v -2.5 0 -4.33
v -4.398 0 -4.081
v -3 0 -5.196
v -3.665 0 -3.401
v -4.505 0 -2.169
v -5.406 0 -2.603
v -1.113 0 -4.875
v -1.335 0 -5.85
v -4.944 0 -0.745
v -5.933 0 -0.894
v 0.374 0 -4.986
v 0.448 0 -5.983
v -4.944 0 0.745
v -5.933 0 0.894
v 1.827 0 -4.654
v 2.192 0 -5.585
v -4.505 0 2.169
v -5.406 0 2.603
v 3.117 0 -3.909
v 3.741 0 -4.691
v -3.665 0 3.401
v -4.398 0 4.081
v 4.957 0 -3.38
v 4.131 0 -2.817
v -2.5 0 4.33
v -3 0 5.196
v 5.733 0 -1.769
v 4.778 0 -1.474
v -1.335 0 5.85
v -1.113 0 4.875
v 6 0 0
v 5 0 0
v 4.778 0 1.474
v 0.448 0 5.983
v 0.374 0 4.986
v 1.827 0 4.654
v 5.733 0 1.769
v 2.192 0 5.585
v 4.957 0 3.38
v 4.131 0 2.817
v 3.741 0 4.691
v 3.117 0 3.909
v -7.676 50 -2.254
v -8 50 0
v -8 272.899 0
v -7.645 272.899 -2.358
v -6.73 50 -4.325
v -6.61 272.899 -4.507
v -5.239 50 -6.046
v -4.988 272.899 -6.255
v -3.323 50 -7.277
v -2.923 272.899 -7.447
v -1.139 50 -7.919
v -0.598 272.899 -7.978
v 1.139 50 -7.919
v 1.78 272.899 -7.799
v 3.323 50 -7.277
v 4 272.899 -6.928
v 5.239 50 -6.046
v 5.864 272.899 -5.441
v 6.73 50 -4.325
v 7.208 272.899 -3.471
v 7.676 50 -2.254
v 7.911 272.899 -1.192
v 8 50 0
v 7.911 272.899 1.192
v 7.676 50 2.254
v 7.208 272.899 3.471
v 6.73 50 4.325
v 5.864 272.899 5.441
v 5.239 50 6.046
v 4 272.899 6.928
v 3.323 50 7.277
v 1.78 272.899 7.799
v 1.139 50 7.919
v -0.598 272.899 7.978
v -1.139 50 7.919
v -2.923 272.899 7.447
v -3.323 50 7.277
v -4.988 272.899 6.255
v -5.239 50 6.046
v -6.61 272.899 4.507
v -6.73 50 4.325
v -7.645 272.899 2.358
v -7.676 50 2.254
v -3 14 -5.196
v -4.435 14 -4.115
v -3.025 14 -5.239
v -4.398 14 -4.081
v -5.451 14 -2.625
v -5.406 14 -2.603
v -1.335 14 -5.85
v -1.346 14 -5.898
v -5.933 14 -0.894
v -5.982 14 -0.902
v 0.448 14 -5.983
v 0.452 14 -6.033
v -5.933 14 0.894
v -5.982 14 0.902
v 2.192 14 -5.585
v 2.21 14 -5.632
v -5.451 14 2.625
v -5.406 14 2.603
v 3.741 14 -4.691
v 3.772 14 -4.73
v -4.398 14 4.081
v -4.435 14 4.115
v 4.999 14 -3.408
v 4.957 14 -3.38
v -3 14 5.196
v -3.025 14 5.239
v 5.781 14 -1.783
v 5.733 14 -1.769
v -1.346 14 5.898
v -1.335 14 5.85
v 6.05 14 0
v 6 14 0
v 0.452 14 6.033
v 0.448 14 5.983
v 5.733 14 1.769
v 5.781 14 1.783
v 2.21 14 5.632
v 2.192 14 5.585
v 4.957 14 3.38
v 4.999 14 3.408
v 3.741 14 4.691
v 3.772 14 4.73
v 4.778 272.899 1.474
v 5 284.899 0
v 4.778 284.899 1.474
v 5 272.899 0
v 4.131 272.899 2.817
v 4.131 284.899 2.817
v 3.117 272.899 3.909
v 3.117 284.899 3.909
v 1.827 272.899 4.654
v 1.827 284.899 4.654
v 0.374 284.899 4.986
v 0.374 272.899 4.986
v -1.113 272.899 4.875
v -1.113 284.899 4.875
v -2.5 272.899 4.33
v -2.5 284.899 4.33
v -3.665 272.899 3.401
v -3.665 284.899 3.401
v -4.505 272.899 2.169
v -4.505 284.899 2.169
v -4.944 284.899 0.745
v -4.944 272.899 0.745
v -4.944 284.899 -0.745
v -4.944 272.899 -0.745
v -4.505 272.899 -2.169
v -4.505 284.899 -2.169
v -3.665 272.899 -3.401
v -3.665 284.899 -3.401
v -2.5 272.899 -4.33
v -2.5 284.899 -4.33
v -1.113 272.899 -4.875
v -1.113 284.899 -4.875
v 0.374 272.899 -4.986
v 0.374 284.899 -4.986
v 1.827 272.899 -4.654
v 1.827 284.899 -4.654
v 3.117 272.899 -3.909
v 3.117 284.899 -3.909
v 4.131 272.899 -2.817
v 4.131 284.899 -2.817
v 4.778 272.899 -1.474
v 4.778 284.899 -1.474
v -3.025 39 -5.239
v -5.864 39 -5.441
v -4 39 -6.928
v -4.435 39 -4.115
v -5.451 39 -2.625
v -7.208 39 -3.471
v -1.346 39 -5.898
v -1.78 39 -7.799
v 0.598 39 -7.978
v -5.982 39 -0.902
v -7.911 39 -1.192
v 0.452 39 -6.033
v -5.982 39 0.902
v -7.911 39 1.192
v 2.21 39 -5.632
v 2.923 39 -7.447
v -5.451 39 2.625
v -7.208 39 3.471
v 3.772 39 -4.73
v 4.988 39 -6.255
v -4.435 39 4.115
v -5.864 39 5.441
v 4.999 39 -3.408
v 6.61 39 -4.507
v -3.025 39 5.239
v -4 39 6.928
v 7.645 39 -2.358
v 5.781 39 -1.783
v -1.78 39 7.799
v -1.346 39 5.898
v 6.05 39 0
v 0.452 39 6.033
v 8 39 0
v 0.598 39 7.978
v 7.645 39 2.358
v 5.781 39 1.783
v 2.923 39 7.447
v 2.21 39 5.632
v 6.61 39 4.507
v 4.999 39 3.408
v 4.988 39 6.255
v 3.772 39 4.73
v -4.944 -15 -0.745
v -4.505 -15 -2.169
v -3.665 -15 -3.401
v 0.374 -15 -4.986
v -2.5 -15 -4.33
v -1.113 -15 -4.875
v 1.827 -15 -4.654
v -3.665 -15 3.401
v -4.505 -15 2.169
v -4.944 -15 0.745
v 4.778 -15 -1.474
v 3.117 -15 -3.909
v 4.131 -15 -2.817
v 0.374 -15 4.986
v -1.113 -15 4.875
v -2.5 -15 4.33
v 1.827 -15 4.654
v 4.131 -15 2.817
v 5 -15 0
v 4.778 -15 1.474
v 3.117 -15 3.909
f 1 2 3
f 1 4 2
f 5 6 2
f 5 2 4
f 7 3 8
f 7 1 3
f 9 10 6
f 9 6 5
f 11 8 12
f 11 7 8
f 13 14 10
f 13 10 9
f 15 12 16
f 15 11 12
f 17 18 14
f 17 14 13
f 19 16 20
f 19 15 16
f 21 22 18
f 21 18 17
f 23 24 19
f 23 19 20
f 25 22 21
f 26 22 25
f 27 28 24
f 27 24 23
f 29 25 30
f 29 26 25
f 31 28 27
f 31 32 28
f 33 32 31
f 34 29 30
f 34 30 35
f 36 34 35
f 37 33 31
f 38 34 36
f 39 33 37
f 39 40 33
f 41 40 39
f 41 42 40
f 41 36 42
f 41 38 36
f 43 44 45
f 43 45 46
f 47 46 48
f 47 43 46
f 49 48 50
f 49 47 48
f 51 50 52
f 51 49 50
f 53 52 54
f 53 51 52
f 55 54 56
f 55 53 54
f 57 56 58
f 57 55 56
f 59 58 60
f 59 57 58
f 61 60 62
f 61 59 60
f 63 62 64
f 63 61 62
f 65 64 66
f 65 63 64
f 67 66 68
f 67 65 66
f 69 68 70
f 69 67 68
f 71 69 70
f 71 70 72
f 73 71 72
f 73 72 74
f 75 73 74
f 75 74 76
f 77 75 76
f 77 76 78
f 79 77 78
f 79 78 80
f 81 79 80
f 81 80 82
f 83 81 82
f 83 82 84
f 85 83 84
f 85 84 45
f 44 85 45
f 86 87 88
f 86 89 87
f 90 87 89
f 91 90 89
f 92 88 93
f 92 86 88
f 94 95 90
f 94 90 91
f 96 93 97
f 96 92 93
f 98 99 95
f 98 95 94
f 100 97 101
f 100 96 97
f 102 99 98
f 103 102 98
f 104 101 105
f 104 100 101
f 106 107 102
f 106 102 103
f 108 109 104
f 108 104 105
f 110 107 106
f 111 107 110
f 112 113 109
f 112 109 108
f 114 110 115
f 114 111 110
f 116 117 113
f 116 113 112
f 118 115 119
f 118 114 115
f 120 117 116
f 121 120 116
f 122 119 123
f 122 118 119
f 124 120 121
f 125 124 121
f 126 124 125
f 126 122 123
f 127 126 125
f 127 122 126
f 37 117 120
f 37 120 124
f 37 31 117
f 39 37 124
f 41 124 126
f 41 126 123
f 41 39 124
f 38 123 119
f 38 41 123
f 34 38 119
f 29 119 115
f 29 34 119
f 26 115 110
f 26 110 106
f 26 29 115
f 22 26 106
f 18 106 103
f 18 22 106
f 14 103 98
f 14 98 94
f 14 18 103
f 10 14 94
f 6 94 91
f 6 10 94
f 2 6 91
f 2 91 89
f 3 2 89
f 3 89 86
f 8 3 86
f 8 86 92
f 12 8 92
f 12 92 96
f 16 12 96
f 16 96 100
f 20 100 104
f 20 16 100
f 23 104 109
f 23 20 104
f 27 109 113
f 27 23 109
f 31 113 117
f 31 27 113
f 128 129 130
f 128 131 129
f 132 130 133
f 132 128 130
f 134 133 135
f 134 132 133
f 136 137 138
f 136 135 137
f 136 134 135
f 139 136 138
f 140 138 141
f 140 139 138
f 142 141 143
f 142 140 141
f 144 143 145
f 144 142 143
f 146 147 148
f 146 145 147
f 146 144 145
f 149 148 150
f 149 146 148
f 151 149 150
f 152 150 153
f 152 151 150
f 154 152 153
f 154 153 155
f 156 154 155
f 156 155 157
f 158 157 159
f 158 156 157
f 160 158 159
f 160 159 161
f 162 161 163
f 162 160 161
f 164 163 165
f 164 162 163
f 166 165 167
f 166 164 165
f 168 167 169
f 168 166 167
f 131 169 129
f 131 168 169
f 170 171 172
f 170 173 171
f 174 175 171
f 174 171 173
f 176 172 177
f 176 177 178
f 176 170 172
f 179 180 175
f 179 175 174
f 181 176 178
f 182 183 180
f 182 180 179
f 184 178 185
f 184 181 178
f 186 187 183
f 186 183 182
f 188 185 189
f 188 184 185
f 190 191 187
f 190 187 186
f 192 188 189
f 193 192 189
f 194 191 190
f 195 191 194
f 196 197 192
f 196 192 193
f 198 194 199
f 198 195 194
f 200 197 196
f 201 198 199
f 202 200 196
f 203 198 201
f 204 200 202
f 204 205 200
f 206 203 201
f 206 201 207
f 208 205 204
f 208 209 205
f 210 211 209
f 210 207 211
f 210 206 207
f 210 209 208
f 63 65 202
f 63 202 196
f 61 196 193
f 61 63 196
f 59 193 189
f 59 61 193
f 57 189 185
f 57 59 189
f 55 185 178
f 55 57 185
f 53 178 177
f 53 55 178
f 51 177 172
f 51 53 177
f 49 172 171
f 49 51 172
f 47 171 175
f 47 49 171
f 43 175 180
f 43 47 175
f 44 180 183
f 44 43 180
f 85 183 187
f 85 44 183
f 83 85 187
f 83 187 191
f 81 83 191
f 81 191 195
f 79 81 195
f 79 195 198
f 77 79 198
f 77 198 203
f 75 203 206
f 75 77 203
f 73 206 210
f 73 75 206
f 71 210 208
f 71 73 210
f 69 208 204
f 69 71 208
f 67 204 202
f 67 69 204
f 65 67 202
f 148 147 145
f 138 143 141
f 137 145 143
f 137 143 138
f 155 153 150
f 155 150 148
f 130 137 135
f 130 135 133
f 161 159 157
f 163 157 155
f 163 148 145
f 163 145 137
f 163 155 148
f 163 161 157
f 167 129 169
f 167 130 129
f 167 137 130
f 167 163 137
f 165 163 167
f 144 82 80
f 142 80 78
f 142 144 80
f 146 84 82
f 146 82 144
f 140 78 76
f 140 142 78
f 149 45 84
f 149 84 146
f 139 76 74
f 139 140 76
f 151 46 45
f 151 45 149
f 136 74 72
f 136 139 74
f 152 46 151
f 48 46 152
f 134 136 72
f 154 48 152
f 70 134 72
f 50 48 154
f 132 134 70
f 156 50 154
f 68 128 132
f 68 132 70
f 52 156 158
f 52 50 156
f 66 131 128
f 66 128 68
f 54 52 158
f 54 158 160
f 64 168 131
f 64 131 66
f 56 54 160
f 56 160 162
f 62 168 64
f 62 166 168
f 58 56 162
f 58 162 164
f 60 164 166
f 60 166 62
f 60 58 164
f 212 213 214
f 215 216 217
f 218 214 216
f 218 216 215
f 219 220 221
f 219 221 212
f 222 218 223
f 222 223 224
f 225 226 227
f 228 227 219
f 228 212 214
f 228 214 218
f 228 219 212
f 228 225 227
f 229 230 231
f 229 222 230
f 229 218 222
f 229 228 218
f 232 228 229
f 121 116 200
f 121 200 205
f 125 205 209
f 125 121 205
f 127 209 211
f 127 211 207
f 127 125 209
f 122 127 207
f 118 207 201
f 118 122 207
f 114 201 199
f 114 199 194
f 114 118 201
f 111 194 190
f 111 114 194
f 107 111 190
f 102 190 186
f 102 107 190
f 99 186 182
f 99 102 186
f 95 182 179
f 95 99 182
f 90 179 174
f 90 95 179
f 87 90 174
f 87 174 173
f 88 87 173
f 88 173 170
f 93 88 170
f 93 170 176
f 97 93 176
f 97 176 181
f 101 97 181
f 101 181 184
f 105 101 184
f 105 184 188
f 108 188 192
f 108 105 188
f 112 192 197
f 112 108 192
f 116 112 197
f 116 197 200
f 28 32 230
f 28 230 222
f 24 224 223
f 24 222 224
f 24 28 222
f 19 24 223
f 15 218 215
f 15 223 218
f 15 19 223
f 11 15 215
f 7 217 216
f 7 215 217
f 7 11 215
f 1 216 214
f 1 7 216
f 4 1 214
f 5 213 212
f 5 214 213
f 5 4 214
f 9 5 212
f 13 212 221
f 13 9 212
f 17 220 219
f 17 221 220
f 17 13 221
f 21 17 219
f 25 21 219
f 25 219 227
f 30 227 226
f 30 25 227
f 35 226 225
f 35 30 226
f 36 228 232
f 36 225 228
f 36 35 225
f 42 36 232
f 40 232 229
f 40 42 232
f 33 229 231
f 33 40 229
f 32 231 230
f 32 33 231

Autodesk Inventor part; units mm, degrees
ref_plane "YZ Plane" through (0, 0, 0) normal (1, 0, 0) x (0, 1, 0)
ref_plane "XZ Plane" through (0, 0, 0) normal (0, 1, 0) x (-1, 0, 0)
ref_plane "XY Plane" through (0, 0, 0) normal (0, 0, 1) x (1, 0, 0)
sketch "Sketch1" plane through (0, 0, 0) normal (0, 1, 0) x (-1, 0, 0)
  circle A0 centre (0, 0) radius 8
  dimension "d0" = 16
extrude "Extrusion1" add sketch "Sketch1" along normal blind 300
sketch "Sketch2" plane through (0, 0, 0) normal (0, -1, 0) x (1, 0, 0)
  circle A0 centre (0, 0) radius 8 projected
extrude "Extrusion2" cut sketch "Sketch2" against normal blind 50
sketch "Sketch3" plane through (0, 50, 0) normal (0, -1, 0) x (1, 0, 0)
  circle A0 centre (0, 0) radius 8 projected
extrude "Extrusion3" add sketch "Sketch3" along normal blind 50
sketch "Sketch4" plane through (0, 0, 0) normal (0, -1, 0) x (1, 0, 0)
  circle A0 centre (0, 0) radius 8 projected
  circle A1 centre (0, 0) radius 6
  dimension "d7" = 12
extrude "Extrusion4" cut sketch "Sketch4" against normal blind 14
thread "Thread1" size "M12x1" class "6g" standard "ANSI Metric M Profile" full length
sketch "Sketch6" plane through (0, 14, 0) normal (0, -1, 0) x (1, 0, 0)
  circle A0 centre (0, 0) radius 8 projected
  circle A1 centre (0, 0) radius 6.05
  dimension "d13" = 12.1
extrude "Extrusion5" cut sketch "Sketch6" against normal blind 25
sketch "Sketch7" plane through (0, 0, 0) normal (0, -1, 0) x (1, 0, 0)
  circle A0 centre (0, 0) radius 6 projected
  circle A1 centre (0, 0) radius 5
  dimension "d16" = 10
extrude "Extrusion6" add sketch "Sketch7" along normal blind 15 contours A1
sketch "Sketch8" plane through (0, 300, 0) normal (0, 1, 0) x (1, 0, 0)
  circle A0 centre (0, 0) radius 8 projected
extrude "Extrusion7" cut sketch "Sketch8" against normal blind 27.101
sketch "Sketch9" plane through (0, 272.899, 0) normal (0, 1, 0) x (1, 0, 0)
  circle A0 centre (0, 0) radius 8 projected
  circle A1 centre (0, 0) radius 5
  dimension "d21" = 10
extrude "Extrusion8" add sketch "Sketch9" along normal blind 12 contours A1
properties part number "1605_300mm"
